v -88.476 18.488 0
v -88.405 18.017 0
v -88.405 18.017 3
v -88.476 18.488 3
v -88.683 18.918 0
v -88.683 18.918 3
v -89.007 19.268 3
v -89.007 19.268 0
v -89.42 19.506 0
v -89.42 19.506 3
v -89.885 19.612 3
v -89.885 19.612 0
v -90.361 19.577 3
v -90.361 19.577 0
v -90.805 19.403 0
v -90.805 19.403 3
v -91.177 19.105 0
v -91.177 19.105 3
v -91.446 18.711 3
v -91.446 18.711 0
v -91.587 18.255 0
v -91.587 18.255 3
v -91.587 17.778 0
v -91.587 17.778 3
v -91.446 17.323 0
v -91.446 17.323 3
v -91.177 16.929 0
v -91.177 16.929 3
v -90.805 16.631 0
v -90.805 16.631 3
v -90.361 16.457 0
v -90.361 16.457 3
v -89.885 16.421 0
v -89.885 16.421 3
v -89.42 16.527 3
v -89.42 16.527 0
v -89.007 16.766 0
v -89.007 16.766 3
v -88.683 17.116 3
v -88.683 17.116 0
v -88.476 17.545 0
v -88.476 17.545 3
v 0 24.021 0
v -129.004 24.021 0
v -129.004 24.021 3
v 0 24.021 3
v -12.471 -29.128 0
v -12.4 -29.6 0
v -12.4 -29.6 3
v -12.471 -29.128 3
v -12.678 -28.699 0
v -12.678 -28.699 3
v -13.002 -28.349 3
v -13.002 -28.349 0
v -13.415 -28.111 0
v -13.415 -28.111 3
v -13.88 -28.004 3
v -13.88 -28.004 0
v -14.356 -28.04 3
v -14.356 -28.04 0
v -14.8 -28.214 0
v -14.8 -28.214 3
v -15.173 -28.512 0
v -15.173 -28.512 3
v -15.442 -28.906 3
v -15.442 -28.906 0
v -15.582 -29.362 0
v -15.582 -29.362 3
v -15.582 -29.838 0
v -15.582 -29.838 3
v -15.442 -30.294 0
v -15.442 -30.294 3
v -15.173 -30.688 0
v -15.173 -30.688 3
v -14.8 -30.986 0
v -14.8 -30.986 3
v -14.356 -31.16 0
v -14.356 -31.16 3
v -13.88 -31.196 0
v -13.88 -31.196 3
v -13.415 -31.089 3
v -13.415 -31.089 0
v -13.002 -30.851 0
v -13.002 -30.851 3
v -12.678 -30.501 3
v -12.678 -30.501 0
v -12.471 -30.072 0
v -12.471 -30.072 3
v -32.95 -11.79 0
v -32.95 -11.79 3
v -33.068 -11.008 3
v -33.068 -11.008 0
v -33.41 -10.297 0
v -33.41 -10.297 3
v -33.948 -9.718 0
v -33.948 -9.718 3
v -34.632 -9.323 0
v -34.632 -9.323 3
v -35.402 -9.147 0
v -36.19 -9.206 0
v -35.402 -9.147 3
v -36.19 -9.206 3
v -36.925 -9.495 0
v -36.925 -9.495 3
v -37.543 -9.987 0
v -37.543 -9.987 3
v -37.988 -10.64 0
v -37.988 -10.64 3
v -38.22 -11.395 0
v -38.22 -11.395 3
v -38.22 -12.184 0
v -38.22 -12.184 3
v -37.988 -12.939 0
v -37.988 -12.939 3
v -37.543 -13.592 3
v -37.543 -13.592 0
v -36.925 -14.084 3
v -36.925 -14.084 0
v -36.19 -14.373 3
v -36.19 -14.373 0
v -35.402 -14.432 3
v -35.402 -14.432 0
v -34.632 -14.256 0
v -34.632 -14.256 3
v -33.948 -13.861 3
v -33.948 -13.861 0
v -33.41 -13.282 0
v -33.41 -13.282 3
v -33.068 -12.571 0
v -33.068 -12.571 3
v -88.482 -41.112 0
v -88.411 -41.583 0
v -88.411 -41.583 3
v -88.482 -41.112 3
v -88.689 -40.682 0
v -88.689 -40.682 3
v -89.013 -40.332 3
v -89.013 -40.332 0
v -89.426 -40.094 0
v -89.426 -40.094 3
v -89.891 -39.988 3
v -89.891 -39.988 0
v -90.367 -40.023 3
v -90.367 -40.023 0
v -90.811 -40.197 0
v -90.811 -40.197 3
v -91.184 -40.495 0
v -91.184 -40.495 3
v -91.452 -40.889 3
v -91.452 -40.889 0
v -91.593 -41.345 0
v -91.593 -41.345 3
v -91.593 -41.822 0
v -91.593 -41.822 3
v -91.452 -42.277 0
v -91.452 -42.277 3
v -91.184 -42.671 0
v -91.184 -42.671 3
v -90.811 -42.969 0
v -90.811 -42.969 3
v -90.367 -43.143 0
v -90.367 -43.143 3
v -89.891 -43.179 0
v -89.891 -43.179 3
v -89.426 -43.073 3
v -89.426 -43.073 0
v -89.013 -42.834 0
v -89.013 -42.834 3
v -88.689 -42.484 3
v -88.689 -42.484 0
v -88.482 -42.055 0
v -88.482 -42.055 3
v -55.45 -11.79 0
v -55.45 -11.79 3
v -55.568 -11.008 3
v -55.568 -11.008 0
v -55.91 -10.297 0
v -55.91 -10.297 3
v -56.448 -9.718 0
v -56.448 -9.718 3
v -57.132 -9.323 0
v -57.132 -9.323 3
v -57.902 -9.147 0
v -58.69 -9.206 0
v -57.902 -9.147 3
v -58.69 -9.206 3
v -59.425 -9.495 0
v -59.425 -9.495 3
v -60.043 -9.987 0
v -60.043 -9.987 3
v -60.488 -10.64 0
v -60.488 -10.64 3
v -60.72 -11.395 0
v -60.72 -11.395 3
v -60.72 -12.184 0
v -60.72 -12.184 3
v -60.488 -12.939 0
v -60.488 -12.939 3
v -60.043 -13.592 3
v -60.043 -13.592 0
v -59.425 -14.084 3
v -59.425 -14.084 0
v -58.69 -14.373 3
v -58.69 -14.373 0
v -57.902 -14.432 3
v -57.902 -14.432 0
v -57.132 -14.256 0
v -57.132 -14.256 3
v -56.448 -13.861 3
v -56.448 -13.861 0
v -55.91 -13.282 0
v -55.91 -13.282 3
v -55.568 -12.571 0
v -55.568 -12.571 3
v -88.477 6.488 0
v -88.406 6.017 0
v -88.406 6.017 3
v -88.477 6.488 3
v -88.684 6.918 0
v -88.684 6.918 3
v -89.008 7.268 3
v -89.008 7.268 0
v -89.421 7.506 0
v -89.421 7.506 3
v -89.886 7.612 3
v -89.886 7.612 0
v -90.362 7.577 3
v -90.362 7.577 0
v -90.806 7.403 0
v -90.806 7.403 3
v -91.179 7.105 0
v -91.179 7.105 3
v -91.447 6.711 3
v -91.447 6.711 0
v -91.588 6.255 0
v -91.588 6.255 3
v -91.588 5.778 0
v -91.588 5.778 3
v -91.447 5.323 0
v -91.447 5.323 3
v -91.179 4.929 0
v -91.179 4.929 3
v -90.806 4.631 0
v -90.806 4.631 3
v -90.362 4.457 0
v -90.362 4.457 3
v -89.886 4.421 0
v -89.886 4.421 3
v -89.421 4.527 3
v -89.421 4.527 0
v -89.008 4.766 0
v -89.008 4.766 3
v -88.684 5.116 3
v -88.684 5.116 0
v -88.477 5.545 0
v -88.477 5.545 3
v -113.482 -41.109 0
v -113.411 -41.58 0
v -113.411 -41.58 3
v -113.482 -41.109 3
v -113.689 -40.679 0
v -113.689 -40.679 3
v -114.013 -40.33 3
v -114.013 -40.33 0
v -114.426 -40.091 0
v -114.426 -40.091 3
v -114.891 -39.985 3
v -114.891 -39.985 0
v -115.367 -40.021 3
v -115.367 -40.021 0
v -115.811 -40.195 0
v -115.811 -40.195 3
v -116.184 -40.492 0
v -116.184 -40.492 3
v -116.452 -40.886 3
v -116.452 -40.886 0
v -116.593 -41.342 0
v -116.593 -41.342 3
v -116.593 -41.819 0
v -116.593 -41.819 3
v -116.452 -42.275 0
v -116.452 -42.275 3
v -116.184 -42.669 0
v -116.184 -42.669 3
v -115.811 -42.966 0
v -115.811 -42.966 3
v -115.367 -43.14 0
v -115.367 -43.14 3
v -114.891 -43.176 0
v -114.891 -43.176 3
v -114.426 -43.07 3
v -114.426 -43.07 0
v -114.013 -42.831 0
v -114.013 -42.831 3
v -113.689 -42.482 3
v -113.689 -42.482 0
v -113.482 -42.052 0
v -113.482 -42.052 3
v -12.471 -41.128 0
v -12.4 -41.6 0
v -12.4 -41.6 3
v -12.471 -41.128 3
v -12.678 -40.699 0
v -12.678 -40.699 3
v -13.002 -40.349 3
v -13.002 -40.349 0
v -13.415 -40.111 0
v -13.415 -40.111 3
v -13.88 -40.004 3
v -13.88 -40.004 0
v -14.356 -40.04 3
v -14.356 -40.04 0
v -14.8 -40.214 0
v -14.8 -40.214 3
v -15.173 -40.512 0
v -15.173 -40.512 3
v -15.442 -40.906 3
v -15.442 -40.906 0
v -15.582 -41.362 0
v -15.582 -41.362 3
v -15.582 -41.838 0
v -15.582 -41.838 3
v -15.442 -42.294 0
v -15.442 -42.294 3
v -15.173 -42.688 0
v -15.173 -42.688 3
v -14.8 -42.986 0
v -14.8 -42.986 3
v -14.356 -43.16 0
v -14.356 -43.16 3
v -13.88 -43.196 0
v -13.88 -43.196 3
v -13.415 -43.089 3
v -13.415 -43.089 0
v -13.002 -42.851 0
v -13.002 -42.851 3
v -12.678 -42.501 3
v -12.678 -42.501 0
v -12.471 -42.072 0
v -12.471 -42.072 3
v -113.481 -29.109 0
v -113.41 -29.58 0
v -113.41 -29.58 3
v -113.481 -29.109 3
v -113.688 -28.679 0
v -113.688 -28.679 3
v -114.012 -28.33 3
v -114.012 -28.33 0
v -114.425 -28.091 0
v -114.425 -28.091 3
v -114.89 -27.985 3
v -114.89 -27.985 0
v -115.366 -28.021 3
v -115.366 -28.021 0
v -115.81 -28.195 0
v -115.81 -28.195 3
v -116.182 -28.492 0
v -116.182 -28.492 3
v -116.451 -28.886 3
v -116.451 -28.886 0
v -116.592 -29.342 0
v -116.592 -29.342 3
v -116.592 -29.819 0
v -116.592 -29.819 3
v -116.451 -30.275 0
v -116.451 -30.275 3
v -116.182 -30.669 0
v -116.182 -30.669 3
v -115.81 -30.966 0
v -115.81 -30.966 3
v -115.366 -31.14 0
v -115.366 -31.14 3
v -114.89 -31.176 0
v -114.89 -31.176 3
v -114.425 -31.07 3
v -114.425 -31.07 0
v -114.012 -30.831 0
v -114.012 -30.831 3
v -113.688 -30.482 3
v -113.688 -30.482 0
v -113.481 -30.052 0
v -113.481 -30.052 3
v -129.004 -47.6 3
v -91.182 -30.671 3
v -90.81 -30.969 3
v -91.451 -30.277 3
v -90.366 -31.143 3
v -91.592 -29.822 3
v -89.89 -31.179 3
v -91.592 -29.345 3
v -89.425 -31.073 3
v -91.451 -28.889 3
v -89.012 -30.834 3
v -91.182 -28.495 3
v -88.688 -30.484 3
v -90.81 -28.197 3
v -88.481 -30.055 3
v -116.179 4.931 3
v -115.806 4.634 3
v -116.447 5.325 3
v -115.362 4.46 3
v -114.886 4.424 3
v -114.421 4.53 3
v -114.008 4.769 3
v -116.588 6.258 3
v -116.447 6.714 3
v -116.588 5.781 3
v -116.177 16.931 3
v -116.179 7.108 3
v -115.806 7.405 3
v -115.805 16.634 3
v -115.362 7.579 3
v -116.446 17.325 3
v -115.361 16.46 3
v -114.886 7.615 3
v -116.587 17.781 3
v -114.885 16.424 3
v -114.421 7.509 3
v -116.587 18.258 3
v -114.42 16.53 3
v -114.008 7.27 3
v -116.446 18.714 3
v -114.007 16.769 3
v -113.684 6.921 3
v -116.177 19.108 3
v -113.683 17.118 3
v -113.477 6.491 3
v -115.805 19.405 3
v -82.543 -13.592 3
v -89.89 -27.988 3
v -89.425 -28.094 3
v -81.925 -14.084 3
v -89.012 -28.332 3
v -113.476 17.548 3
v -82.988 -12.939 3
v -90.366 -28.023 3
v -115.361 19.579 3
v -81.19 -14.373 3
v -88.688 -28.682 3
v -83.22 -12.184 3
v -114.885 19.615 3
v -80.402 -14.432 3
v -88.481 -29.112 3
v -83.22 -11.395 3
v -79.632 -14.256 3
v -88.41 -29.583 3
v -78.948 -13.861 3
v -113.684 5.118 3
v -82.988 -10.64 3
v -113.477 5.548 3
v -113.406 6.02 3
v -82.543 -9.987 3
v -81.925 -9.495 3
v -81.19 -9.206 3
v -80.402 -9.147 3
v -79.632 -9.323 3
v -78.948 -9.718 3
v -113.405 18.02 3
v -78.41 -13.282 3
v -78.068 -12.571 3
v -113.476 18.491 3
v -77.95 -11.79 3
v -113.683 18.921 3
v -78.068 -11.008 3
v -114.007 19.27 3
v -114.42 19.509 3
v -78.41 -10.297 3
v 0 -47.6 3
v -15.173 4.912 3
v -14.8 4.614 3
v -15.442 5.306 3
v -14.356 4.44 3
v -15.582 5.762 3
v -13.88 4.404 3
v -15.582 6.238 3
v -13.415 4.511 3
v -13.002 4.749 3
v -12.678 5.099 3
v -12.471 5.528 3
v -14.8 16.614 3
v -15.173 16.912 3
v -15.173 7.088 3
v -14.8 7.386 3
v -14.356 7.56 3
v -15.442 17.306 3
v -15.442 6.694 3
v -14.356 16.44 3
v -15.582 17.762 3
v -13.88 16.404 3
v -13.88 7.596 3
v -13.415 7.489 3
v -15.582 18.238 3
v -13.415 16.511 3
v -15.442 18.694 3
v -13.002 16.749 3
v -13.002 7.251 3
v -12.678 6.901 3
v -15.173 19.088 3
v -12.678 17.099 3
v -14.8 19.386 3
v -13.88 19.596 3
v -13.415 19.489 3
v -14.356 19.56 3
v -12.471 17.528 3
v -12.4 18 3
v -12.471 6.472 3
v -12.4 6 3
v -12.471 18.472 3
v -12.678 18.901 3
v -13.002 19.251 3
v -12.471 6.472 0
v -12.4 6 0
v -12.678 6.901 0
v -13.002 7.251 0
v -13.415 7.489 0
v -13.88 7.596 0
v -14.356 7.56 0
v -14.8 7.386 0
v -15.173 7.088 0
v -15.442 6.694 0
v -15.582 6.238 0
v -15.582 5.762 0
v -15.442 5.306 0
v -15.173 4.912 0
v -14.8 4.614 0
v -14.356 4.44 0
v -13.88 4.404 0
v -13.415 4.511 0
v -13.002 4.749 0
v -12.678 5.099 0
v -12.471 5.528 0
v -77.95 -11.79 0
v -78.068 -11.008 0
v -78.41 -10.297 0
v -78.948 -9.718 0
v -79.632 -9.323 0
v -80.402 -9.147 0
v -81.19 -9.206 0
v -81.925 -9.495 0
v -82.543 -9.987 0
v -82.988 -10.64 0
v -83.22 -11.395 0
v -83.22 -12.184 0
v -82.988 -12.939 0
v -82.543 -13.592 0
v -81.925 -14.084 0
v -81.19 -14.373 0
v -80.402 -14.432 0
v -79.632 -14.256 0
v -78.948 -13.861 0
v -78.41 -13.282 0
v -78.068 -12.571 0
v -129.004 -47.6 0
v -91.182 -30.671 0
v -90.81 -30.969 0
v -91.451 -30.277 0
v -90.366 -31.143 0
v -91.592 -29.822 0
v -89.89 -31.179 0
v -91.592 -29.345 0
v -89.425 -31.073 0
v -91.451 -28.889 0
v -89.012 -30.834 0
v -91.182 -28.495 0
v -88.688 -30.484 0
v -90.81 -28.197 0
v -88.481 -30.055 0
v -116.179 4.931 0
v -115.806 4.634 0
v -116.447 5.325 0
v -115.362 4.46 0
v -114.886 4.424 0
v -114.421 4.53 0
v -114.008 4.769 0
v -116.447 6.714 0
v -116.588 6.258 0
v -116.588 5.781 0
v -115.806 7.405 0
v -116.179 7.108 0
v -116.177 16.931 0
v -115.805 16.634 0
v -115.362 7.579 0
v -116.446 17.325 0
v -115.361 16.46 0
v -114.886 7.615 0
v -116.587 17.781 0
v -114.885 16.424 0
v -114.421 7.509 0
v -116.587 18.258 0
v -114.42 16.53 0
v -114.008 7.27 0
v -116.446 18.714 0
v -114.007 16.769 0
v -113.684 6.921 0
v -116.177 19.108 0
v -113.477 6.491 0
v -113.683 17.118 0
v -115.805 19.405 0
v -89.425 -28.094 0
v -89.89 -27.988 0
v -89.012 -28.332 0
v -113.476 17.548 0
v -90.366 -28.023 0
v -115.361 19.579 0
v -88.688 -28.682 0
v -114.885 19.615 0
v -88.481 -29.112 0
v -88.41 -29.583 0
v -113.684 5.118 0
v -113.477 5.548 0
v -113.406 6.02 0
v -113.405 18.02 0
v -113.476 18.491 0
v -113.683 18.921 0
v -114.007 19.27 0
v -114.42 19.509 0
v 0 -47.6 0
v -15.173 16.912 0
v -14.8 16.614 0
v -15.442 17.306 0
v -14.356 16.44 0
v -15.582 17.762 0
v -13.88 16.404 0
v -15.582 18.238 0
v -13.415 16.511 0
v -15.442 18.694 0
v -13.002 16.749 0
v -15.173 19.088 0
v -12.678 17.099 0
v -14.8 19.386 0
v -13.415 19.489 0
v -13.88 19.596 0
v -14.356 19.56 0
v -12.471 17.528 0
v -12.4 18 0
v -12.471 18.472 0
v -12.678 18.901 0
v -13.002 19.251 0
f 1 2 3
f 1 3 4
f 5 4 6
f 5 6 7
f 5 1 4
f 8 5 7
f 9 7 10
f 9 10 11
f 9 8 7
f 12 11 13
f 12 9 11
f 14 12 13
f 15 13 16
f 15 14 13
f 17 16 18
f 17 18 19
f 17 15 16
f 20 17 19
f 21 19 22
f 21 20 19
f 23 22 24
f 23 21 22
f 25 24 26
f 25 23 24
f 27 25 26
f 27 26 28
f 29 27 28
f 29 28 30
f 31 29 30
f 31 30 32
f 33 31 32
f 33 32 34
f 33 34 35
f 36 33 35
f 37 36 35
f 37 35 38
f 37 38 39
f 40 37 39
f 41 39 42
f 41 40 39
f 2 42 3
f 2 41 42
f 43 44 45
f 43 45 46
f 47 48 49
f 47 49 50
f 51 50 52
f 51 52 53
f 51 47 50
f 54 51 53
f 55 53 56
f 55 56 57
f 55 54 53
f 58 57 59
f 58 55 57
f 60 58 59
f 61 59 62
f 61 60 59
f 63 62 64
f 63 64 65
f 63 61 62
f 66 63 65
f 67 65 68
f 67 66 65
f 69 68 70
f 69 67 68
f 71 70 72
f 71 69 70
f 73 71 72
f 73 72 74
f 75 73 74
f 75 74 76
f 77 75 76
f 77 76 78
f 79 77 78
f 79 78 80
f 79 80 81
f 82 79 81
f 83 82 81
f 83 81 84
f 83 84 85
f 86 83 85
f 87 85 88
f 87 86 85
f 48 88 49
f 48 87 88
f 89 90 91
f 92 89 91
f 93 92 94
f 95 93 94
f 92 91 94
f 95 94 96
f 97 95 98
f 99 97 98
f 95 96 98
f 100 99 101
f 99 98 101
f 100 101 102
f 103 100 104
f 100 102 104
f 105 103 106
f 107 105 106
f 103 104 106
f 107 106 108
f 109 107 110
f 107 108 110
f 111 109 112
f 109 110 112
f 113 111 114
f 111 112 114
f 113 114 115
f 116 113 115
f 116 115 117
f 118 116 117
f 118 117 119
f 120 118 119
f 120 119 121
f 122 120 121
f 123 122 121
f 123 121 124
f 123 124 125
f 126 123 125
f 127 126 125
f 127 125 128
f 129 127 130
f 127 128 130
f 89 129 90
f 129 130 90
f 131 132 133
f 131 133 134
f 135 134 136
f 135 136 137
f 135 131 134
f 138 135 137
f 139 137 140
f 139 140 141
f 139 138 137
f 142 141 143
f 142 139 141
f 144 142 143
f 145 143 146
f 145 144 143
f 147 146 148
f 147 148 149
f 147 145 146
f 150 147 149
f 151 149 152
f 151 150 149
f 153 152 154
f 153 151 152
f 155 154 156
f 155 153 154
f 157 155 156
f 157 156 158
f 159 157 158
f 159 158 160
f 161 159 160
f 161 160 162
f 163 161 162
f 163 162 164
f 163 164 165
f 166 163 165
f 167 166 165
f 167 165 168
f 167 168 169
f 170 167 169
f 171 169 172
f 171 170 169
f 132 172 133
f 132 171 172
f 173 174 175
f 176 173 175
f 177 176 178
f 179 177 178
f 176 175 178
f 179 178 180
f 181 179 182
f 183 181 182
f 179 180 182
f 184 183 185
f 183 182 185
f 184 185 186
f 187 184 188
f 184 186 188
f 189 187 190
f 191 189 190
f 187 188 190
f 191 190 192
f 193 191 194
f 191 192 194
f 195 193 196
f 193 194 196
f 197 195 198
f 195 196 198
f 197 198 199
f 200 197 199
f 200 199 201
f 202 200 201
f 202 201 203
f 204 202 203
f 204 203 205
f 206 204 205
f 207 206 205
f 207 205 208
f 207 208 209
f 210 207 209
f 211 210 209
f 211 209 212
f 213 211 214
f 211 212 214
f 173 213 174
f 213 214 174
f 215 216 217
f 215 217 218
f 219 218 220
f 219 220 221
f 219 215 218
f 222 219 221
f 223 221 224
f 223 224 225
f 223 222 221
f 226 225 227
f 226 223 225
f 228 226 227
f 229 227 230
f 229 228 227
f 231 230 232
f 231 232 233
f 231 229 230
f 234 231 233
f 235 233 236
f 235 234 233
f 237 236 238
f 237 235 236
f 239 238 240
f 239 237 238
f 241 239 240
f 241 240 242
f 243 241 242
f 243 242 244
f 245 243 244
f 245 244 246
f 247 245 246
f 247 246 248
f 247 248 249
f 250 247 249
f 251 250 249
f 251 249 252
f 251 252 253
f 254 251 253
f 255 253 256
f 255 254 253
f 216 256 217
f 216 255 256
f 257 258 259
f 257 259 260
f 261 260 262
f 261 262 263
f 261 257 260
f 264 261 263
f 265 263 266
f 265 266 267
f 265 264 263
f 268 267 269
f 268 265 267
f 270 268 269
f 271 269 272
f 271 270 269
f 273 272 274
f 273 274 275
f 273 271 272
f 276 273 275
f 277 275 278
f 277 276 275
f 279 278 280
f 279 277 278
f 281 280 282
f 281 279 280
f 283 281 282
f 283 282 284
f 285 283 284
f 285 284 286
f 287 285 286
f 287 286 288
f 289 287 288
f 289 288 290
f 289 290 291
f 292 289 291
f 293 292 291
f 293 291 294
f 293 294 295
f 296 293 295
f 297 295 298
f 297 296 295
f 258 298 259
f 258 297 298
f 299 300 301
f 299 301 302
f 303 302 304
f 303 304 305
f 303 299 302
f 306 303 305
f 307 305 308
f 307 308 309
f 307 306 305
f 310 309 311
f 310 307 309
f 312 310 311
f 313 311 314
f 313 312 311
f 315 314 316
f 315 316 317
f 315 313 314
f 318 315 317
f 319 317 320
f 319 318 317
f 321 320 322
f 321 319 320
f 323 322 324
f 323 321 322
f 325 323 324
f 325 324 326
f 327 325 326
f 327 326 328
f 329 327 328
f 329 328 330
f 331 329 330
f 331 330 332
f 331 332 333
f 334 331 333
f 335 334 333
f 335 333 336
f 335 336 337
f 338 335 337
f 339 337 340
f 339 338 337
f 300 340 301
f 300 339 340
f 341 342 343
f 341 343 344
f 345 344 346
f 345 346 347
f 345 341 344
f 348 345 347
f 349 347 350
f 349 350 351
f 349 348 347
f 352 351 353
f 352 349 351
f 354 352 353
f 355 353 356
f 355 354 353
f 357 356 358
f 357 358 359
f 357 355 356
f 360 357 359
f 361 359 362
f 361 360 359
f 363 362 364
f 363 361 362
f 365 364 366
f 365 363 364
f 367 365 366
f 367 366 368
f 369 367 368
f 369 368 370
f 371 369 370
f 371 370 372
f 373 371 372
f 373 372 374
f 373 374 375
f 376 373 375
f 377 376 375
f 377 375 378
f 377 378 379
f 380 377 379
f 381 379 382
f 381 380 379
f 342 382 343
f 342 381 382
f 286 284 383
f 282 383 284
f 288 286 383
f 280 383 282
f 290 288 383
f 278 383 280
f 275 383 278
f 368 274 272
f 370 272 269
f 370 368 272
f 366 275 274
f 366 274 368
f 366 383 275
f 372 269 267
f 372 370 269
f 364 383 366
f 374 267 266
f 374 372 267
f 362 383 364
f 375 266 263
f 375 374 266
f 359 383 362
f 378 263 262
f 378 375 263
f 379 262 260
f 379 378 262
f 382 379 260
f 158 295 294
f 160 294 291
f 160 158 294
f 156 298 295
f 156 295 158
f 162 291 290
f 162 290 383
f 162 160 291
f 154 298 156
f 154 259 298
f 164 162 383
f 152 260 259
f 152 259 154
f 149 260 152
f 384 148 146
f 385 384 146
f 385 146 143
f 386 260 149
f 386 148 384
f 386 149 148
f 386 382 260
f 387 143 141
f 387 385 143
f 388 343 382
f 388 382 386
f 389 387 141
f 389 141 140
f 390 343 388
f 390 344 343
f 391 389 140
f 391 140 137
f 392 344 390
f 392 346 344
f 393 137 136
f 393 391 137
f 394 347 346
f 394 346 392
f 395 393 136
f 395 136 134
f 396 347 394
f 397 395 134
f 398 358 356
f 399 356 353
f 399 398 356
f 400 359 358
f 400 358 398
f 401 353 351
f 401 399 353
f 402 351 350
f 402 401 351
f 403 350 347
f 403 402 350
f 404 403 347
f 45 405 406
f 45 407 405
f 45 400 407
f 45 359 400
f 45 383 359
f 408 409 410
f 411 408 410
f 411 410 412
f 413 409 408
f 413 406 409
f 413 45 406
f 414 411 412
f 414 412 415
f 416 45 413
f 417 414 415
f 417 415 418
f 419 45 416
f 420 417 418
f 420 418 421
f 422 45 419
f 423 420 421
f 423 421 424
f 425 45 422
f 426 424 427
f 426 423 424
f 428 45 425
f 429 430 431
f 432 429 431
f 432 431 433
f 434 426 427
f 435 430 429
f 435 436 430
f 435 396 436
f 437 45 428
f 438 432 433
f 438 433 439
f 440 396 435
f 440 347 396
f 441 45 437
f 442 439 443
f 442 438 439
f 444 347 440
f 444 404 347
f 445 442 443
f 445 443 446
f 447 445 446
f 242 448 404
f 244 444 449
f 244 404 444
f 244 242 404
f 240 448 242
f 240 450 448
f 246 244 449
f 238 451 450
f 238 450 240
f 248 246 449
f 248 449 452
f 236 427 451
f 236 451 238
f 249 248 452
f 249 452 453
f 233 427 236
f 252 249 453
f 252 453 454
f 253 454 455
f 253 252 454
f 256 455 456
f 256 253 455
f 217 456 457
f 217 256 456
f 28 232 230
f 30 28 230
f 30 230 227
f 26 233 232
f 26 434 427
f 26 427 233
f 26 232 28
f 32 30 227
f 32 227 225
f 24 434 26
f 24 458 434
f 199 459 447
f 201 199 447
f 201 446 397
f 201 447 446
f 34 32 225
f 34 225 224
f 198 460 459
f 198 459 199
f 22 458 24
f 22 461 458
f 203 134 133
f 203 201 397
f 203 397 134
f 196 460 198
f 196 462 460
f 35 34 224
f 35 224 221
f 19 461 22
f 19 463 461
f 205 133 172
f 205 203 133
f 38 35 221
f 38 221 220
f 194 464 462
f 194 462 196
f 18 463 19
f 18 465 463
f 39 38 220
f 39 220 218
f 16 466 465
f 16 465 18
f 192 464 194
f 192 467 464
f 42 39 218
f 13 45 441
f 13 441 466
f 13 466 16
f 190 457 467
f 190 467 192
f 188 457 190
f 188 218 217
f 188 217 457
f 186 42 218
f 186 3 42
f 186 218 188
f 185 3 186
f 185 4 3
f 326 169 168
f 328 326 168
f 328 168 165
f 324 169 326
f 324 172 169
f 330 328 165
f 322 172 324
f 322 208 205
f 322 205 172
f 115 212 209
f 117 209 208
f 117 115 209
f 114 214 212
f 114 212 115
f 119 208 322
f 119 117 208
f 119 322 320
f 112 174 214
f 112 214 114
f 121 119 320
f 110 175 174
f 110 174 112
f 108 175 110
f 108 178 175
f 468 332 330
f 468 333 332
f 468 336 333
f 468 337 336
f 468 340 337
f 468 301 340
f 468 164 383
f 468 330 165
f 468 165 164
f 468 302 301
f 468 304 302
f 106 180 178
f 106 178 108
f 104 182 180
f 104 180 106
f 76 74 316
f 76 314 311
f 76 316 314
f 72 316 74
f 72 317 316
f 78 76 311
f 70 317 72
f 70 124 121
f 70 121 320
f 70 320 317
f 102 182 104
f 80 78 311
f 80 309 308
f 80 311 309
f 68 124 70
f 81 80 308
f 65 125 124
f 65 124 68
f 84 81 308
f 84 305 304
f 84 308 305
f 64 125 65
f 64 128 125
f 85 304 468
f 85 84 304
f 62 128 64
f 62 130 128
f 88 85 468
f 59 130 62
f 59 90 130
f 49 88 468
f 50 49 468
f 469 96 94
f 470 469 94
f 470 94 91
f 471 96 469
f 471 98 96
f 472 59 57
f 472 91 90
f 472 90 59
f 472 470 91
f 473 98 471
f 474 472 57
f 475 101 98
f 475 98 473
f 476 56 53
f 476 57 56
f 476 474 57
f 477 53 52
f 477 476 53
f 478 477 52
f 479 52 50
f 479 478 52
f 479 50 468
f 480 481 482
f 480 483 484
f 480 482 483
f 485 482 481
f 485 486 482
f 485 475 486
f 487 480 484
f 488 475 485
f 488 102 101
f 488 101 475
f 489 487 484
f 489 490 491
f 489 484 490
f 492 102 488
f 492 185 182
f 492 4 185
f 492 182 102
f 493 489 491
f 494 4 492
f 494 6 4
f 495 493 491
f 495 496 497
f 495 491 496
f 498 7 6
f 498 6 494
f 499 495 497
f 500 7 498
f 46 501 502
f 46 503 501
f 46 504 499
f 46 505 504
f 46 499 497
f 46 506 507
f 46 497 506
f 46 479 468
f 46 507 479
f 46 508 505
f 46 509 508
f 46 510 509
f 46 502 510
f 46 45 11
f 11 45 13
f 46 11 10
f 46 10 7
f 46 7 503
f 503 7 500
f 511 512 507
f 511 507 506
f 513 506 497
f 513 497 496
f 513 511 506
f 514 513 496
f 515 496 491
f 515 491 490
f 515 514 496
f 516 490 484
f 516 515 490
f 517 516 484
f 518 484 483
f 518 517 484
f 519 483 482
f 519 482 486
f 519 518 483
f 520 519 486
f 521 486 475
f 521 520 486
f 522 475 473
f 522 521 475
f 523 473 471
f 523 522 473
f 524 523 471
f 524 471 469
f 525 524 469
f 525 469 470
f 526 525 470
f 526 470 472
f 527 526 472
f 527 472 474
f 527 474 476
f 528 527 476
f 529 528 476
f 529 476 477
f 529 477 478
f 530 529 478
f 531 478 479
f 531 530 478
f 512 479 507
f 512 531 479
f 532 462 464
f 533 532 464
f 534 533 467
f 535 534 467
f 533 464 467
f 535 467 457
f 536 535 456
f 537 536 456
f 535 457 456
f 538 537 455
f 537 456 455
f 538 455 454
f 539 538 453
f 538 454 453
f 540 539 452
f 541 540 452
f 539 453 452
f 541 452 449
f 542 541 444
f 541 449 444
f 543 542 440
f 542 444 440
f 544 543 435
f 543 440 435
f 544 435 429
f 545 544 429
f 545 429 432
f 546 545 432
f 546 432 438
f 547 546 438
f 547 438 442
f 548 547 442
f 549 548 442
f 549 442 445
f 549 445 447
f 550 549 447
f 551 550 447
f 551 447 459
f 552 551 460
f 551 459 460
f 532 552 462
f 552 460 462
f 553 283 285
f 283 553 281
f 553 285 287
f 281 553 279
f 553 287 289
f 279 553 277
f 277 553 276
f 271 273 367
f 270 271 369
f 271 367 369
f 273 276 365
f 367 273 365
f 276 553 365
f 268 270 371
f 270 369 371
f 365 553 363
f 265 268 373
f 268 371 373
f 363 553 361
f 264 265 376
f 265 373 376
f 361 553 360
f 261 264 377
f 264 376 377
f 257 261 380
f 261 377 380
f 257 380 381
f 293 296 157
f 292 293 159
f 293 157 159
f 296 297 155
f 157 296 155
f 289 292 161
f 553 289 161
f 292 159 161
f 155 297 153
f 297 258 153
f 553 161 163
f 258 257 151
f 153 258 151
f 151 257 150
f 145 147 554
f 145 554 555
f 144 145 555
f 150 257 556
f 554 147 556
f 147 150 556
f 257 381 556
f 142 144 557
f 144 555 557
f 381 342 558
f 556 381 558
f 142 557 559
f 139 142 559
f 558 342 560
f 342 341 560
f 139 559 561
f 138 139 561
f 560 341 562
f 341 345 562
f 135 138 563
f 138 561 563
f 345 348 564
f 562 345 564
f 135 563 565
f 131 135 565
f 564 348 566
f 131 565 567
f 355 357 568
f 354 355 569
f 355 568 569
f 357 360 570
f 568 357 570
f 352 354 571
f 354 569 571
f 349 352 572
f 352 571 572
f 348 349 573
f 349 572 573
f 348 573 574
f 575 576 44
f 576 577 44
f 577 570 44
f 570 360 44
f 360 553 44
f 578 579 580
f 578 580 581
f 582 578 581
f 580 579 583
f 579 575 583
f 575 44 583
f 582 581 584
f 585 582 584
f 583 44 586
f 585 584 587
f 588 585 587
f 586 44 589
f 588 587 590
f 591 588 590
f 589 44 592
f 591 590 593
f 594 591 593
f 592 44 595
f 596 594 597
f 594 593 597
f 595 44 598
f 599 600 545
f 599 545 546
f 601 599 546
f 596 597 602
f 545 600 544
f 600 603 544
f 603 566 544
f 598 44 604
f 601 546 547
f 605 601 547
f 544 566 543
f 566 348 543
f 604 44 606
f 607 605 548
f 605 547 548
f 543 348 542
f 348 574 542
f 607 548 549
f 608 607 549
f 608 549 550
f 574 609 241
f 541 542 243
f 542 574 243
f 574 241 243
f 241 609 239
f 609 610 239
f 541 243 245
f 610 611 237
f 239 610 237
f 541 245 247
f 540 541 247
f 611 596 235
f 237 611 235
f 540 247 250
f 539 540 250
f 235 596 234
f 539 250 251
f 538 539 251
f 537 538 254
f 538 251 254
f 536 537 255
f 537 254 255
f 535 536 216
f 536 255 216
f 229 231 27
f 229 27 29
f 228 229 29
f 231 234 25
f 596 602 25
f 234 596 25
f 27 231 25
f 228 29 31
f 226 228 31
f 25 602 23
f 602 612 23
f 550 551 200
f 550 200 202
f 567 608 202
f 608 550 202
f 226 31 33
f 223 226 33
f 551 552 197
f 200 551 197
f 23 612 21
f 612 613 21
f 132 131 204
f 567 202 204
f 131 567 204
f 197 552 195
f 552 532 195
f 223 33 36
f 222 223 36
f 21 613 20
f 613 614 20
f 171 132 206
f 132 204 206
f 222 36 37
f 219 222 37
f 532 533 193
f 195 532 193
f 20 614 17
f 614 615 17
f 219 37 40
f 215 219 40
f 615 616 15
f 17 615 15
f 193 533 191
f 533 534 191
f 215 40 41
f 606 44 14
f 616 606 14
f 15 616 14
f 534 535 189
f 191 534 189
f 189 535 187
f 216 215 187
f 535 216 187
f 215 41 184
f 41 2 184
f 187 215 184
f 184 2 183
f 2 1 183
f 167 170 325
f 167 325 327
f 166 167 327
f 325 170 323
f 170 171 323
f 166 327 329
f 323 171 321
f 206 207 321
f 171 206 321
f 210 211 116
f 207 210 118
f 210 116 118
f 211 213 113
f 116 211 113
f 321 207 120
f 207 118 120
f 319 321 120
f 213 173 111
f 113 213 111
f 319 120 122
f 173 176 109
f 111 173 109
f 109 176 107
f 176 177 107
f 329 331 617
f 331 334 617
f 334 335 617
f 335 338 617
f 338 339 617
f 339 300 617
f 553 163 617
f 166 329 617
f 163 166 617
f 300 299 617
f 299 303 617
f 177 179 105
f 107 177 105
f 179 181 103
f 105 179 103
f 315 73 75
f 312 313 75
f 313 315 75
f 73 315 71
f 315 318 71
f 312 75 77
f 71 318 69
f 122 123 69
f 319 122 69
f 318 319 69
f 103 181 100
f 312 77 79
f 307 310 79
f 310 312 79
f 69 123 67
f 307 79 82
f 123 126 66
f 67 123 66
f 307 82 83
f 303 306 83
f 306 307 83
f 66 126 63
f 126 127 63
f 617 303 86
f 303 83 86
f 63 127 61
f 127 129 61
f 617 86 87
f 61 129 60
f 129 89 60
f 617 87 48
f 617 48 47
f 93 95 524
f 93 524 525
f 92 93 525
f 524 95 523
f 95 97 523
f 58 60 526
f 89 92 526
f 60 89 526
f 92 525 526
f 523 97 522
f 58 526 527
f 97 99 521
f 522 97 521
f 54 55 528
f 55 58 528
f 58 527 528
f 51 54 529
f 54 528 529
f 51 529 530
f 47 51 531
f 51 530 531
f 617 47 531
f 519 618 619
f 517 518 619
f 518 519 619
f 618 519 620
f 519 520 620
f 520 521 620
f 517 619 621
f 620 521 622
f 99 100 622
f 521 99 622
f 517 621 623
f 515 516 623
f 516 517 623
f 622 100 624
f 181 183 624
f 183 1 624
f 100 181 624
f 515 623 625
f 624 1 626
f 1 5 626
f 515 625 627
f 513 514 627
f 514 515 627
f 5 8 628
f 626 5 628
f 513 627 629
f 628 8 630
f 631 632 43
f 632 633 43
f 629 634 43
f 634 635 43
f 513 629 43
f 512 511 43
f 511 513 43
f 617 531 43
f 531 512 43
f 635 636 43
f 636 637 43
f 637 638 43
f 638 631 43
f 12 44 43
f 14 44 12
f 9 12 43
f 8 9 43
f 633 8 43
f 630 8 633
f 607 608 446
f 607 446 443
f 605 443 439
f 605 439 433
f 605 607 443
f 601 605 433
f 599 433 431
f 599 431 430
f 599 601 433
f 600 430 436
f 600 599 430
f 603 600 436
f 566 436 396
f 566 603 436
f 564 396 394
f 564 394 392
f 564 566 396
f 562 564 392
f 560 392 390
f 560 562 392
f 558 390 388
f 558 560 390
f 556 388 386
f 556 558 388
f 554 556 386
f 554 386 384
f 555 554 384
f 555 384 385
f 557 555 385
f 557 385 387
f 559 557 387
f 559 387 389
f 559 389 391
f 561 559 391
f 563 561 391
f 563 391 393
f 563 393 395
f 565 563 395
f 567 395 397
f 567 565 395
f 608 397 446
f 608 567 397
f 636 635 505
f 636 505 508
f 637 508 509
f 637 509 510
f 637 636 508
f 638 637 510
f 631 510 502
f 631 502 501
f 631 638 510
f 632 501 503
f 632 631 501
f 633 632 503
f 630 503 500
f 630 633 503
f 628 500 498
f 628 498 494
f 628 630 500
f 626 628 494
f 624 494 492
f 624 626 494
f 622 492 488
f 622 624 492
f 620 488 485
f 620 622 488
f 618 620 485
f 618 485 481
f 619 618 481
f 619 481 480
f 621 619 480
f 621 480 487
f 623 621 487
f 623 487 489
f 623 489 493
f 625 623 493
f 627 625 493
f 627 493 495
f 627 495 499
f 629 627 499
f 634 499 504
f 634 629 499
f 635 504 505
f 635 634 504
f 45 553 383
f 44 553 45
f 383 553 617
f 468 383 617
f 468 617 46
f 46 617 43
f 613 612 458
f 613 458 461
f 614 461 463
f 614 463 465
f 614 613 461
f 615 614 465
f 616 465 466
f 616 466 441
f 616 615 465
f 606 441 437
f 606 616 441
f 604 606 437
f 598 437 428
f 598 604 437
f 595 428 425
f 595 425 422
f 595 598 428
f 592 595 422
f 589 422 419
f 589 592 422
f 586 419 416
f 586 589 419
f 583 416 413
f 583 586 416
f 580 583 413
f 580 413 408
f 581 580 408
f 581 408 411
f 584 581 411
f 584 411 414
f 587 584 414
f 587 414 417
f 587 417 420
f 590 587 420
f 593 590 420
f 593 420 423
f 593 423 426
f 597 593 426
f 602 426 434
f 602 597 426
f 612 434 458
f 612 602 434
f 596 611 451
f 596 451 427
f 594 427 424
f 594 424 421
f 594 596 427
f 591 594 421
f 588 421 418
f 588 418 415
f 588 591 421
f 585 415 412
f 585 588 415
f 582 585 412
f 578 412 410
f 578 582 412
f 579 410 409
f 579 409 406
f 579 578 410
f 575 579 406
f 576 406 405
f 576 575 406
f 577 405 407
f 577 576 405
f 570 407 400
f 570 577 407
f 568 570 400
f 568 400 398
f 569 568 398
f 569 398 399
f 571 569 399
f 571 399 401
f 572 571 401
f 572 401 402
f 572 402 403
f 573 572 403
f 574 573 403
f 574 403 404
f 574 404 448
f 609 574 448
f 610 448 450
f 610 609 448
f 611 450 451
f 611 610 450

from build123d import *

# Parameters (mm, degrees)
SKETCH_1_W          = 129.003888627
SKETCH_1_H          = 71.620980981
SKETCH_1_R          = 1.6
EXTRUDE_1_DEPTH     = 3
SKETCH_2_R          = 2.65
CUT_EXTRUDE_1_DEPTH = 3
SKETCH_3_R          = 2.65
CUT_EXTRUDE_2_DEPTH = 3


with BuildPart() as part:
    # 草图1 → 凸台-拉伸1 (new body)
    with BuildSketch(Plane.XY):
        with Locations((-64.501944314, -11.78950951)):
            Rectangle(SKETCH_1_W, SKETCH_1_H)
        with Locations((-14, -29.6)):
            Circle(SKETCH_1_R, mode=Mode.SUBTRACT)
        with Locations((-14, -41.6)):
            Circle(SKETCH_1_R, mode=Mode.SUBTRACT)
        with Locations((-14, 6)):
            Circle(SKETCH_1_R, mode=Mode.SUBTRACT)
        with Locations((-14, 18)):
            Circle(SKETCH_1_R, mode=Mode.SUBTRACT)
        with Locations((-90.004518872, 18.016885816)):
            Circle(SKETCH_1_R, mode=Mode.SUBTRACT)
        with Locations((-90.005778933, 6.016885882)):
            Circle(SKETCH_1_R, mode=Mode.SUBTRACT)
        with Locations((-90.010777175, -41.583113855)):
            Circle(SKETCH_1_R, mode=Mode.SUBTRACT)
        with Locations((-90.009517114, -29.583113922)):
            Circle(SKETCH_1_R, mode=Mode.SUBTRACT)
        with Locations((-115.010777037, -41.580488728)):
            Circle(SKETCH_1_R, mode=Mode.SUBTRACT)
        with Locations((-115.009516976, -29.580488794)):
            Circle(SKETCH_1_R, mode=Mode.SUBTRACT)
        with Locations((-115.005778795, 6.019511009)):
            Circle(SKETCH_1_R, mode=Mode.SUBTRACT)
        with Locations((-115.004518734, 18.019510943)):
            Circle(SKETCH_1_R, mode=Mode.SUBTRACT)
    extrude(amount=EXTRUDE_1_DEPTH)

    # 草图2 → 切除-拉伸1 (cut)
    with BuildSketch(Plane.XY.offset(3)):
        with Locations((-58.1, -11.789509509)):
            Circle(SKETCH_2_R)
    extrude(amount=-CUT_EXTRUDE_1_DEPTH, mode=Mode.SUBTRACT)

    # 草图3 → 切除-拉伸2 (cut)
    with BuildSketch(Plane.XY.offset(3)):
        with Locations((-80.6, -11.789509509)):
            Circle(SKETCH_3_R)
        with Locations((-35.6, -11.789509509)):
            Circle(SKETCH_3_R)
    extrude(amount=-CUT_EXTRUDE_2_DEPTH, mode=Mode.SUBTRACT)


solid = part.part
